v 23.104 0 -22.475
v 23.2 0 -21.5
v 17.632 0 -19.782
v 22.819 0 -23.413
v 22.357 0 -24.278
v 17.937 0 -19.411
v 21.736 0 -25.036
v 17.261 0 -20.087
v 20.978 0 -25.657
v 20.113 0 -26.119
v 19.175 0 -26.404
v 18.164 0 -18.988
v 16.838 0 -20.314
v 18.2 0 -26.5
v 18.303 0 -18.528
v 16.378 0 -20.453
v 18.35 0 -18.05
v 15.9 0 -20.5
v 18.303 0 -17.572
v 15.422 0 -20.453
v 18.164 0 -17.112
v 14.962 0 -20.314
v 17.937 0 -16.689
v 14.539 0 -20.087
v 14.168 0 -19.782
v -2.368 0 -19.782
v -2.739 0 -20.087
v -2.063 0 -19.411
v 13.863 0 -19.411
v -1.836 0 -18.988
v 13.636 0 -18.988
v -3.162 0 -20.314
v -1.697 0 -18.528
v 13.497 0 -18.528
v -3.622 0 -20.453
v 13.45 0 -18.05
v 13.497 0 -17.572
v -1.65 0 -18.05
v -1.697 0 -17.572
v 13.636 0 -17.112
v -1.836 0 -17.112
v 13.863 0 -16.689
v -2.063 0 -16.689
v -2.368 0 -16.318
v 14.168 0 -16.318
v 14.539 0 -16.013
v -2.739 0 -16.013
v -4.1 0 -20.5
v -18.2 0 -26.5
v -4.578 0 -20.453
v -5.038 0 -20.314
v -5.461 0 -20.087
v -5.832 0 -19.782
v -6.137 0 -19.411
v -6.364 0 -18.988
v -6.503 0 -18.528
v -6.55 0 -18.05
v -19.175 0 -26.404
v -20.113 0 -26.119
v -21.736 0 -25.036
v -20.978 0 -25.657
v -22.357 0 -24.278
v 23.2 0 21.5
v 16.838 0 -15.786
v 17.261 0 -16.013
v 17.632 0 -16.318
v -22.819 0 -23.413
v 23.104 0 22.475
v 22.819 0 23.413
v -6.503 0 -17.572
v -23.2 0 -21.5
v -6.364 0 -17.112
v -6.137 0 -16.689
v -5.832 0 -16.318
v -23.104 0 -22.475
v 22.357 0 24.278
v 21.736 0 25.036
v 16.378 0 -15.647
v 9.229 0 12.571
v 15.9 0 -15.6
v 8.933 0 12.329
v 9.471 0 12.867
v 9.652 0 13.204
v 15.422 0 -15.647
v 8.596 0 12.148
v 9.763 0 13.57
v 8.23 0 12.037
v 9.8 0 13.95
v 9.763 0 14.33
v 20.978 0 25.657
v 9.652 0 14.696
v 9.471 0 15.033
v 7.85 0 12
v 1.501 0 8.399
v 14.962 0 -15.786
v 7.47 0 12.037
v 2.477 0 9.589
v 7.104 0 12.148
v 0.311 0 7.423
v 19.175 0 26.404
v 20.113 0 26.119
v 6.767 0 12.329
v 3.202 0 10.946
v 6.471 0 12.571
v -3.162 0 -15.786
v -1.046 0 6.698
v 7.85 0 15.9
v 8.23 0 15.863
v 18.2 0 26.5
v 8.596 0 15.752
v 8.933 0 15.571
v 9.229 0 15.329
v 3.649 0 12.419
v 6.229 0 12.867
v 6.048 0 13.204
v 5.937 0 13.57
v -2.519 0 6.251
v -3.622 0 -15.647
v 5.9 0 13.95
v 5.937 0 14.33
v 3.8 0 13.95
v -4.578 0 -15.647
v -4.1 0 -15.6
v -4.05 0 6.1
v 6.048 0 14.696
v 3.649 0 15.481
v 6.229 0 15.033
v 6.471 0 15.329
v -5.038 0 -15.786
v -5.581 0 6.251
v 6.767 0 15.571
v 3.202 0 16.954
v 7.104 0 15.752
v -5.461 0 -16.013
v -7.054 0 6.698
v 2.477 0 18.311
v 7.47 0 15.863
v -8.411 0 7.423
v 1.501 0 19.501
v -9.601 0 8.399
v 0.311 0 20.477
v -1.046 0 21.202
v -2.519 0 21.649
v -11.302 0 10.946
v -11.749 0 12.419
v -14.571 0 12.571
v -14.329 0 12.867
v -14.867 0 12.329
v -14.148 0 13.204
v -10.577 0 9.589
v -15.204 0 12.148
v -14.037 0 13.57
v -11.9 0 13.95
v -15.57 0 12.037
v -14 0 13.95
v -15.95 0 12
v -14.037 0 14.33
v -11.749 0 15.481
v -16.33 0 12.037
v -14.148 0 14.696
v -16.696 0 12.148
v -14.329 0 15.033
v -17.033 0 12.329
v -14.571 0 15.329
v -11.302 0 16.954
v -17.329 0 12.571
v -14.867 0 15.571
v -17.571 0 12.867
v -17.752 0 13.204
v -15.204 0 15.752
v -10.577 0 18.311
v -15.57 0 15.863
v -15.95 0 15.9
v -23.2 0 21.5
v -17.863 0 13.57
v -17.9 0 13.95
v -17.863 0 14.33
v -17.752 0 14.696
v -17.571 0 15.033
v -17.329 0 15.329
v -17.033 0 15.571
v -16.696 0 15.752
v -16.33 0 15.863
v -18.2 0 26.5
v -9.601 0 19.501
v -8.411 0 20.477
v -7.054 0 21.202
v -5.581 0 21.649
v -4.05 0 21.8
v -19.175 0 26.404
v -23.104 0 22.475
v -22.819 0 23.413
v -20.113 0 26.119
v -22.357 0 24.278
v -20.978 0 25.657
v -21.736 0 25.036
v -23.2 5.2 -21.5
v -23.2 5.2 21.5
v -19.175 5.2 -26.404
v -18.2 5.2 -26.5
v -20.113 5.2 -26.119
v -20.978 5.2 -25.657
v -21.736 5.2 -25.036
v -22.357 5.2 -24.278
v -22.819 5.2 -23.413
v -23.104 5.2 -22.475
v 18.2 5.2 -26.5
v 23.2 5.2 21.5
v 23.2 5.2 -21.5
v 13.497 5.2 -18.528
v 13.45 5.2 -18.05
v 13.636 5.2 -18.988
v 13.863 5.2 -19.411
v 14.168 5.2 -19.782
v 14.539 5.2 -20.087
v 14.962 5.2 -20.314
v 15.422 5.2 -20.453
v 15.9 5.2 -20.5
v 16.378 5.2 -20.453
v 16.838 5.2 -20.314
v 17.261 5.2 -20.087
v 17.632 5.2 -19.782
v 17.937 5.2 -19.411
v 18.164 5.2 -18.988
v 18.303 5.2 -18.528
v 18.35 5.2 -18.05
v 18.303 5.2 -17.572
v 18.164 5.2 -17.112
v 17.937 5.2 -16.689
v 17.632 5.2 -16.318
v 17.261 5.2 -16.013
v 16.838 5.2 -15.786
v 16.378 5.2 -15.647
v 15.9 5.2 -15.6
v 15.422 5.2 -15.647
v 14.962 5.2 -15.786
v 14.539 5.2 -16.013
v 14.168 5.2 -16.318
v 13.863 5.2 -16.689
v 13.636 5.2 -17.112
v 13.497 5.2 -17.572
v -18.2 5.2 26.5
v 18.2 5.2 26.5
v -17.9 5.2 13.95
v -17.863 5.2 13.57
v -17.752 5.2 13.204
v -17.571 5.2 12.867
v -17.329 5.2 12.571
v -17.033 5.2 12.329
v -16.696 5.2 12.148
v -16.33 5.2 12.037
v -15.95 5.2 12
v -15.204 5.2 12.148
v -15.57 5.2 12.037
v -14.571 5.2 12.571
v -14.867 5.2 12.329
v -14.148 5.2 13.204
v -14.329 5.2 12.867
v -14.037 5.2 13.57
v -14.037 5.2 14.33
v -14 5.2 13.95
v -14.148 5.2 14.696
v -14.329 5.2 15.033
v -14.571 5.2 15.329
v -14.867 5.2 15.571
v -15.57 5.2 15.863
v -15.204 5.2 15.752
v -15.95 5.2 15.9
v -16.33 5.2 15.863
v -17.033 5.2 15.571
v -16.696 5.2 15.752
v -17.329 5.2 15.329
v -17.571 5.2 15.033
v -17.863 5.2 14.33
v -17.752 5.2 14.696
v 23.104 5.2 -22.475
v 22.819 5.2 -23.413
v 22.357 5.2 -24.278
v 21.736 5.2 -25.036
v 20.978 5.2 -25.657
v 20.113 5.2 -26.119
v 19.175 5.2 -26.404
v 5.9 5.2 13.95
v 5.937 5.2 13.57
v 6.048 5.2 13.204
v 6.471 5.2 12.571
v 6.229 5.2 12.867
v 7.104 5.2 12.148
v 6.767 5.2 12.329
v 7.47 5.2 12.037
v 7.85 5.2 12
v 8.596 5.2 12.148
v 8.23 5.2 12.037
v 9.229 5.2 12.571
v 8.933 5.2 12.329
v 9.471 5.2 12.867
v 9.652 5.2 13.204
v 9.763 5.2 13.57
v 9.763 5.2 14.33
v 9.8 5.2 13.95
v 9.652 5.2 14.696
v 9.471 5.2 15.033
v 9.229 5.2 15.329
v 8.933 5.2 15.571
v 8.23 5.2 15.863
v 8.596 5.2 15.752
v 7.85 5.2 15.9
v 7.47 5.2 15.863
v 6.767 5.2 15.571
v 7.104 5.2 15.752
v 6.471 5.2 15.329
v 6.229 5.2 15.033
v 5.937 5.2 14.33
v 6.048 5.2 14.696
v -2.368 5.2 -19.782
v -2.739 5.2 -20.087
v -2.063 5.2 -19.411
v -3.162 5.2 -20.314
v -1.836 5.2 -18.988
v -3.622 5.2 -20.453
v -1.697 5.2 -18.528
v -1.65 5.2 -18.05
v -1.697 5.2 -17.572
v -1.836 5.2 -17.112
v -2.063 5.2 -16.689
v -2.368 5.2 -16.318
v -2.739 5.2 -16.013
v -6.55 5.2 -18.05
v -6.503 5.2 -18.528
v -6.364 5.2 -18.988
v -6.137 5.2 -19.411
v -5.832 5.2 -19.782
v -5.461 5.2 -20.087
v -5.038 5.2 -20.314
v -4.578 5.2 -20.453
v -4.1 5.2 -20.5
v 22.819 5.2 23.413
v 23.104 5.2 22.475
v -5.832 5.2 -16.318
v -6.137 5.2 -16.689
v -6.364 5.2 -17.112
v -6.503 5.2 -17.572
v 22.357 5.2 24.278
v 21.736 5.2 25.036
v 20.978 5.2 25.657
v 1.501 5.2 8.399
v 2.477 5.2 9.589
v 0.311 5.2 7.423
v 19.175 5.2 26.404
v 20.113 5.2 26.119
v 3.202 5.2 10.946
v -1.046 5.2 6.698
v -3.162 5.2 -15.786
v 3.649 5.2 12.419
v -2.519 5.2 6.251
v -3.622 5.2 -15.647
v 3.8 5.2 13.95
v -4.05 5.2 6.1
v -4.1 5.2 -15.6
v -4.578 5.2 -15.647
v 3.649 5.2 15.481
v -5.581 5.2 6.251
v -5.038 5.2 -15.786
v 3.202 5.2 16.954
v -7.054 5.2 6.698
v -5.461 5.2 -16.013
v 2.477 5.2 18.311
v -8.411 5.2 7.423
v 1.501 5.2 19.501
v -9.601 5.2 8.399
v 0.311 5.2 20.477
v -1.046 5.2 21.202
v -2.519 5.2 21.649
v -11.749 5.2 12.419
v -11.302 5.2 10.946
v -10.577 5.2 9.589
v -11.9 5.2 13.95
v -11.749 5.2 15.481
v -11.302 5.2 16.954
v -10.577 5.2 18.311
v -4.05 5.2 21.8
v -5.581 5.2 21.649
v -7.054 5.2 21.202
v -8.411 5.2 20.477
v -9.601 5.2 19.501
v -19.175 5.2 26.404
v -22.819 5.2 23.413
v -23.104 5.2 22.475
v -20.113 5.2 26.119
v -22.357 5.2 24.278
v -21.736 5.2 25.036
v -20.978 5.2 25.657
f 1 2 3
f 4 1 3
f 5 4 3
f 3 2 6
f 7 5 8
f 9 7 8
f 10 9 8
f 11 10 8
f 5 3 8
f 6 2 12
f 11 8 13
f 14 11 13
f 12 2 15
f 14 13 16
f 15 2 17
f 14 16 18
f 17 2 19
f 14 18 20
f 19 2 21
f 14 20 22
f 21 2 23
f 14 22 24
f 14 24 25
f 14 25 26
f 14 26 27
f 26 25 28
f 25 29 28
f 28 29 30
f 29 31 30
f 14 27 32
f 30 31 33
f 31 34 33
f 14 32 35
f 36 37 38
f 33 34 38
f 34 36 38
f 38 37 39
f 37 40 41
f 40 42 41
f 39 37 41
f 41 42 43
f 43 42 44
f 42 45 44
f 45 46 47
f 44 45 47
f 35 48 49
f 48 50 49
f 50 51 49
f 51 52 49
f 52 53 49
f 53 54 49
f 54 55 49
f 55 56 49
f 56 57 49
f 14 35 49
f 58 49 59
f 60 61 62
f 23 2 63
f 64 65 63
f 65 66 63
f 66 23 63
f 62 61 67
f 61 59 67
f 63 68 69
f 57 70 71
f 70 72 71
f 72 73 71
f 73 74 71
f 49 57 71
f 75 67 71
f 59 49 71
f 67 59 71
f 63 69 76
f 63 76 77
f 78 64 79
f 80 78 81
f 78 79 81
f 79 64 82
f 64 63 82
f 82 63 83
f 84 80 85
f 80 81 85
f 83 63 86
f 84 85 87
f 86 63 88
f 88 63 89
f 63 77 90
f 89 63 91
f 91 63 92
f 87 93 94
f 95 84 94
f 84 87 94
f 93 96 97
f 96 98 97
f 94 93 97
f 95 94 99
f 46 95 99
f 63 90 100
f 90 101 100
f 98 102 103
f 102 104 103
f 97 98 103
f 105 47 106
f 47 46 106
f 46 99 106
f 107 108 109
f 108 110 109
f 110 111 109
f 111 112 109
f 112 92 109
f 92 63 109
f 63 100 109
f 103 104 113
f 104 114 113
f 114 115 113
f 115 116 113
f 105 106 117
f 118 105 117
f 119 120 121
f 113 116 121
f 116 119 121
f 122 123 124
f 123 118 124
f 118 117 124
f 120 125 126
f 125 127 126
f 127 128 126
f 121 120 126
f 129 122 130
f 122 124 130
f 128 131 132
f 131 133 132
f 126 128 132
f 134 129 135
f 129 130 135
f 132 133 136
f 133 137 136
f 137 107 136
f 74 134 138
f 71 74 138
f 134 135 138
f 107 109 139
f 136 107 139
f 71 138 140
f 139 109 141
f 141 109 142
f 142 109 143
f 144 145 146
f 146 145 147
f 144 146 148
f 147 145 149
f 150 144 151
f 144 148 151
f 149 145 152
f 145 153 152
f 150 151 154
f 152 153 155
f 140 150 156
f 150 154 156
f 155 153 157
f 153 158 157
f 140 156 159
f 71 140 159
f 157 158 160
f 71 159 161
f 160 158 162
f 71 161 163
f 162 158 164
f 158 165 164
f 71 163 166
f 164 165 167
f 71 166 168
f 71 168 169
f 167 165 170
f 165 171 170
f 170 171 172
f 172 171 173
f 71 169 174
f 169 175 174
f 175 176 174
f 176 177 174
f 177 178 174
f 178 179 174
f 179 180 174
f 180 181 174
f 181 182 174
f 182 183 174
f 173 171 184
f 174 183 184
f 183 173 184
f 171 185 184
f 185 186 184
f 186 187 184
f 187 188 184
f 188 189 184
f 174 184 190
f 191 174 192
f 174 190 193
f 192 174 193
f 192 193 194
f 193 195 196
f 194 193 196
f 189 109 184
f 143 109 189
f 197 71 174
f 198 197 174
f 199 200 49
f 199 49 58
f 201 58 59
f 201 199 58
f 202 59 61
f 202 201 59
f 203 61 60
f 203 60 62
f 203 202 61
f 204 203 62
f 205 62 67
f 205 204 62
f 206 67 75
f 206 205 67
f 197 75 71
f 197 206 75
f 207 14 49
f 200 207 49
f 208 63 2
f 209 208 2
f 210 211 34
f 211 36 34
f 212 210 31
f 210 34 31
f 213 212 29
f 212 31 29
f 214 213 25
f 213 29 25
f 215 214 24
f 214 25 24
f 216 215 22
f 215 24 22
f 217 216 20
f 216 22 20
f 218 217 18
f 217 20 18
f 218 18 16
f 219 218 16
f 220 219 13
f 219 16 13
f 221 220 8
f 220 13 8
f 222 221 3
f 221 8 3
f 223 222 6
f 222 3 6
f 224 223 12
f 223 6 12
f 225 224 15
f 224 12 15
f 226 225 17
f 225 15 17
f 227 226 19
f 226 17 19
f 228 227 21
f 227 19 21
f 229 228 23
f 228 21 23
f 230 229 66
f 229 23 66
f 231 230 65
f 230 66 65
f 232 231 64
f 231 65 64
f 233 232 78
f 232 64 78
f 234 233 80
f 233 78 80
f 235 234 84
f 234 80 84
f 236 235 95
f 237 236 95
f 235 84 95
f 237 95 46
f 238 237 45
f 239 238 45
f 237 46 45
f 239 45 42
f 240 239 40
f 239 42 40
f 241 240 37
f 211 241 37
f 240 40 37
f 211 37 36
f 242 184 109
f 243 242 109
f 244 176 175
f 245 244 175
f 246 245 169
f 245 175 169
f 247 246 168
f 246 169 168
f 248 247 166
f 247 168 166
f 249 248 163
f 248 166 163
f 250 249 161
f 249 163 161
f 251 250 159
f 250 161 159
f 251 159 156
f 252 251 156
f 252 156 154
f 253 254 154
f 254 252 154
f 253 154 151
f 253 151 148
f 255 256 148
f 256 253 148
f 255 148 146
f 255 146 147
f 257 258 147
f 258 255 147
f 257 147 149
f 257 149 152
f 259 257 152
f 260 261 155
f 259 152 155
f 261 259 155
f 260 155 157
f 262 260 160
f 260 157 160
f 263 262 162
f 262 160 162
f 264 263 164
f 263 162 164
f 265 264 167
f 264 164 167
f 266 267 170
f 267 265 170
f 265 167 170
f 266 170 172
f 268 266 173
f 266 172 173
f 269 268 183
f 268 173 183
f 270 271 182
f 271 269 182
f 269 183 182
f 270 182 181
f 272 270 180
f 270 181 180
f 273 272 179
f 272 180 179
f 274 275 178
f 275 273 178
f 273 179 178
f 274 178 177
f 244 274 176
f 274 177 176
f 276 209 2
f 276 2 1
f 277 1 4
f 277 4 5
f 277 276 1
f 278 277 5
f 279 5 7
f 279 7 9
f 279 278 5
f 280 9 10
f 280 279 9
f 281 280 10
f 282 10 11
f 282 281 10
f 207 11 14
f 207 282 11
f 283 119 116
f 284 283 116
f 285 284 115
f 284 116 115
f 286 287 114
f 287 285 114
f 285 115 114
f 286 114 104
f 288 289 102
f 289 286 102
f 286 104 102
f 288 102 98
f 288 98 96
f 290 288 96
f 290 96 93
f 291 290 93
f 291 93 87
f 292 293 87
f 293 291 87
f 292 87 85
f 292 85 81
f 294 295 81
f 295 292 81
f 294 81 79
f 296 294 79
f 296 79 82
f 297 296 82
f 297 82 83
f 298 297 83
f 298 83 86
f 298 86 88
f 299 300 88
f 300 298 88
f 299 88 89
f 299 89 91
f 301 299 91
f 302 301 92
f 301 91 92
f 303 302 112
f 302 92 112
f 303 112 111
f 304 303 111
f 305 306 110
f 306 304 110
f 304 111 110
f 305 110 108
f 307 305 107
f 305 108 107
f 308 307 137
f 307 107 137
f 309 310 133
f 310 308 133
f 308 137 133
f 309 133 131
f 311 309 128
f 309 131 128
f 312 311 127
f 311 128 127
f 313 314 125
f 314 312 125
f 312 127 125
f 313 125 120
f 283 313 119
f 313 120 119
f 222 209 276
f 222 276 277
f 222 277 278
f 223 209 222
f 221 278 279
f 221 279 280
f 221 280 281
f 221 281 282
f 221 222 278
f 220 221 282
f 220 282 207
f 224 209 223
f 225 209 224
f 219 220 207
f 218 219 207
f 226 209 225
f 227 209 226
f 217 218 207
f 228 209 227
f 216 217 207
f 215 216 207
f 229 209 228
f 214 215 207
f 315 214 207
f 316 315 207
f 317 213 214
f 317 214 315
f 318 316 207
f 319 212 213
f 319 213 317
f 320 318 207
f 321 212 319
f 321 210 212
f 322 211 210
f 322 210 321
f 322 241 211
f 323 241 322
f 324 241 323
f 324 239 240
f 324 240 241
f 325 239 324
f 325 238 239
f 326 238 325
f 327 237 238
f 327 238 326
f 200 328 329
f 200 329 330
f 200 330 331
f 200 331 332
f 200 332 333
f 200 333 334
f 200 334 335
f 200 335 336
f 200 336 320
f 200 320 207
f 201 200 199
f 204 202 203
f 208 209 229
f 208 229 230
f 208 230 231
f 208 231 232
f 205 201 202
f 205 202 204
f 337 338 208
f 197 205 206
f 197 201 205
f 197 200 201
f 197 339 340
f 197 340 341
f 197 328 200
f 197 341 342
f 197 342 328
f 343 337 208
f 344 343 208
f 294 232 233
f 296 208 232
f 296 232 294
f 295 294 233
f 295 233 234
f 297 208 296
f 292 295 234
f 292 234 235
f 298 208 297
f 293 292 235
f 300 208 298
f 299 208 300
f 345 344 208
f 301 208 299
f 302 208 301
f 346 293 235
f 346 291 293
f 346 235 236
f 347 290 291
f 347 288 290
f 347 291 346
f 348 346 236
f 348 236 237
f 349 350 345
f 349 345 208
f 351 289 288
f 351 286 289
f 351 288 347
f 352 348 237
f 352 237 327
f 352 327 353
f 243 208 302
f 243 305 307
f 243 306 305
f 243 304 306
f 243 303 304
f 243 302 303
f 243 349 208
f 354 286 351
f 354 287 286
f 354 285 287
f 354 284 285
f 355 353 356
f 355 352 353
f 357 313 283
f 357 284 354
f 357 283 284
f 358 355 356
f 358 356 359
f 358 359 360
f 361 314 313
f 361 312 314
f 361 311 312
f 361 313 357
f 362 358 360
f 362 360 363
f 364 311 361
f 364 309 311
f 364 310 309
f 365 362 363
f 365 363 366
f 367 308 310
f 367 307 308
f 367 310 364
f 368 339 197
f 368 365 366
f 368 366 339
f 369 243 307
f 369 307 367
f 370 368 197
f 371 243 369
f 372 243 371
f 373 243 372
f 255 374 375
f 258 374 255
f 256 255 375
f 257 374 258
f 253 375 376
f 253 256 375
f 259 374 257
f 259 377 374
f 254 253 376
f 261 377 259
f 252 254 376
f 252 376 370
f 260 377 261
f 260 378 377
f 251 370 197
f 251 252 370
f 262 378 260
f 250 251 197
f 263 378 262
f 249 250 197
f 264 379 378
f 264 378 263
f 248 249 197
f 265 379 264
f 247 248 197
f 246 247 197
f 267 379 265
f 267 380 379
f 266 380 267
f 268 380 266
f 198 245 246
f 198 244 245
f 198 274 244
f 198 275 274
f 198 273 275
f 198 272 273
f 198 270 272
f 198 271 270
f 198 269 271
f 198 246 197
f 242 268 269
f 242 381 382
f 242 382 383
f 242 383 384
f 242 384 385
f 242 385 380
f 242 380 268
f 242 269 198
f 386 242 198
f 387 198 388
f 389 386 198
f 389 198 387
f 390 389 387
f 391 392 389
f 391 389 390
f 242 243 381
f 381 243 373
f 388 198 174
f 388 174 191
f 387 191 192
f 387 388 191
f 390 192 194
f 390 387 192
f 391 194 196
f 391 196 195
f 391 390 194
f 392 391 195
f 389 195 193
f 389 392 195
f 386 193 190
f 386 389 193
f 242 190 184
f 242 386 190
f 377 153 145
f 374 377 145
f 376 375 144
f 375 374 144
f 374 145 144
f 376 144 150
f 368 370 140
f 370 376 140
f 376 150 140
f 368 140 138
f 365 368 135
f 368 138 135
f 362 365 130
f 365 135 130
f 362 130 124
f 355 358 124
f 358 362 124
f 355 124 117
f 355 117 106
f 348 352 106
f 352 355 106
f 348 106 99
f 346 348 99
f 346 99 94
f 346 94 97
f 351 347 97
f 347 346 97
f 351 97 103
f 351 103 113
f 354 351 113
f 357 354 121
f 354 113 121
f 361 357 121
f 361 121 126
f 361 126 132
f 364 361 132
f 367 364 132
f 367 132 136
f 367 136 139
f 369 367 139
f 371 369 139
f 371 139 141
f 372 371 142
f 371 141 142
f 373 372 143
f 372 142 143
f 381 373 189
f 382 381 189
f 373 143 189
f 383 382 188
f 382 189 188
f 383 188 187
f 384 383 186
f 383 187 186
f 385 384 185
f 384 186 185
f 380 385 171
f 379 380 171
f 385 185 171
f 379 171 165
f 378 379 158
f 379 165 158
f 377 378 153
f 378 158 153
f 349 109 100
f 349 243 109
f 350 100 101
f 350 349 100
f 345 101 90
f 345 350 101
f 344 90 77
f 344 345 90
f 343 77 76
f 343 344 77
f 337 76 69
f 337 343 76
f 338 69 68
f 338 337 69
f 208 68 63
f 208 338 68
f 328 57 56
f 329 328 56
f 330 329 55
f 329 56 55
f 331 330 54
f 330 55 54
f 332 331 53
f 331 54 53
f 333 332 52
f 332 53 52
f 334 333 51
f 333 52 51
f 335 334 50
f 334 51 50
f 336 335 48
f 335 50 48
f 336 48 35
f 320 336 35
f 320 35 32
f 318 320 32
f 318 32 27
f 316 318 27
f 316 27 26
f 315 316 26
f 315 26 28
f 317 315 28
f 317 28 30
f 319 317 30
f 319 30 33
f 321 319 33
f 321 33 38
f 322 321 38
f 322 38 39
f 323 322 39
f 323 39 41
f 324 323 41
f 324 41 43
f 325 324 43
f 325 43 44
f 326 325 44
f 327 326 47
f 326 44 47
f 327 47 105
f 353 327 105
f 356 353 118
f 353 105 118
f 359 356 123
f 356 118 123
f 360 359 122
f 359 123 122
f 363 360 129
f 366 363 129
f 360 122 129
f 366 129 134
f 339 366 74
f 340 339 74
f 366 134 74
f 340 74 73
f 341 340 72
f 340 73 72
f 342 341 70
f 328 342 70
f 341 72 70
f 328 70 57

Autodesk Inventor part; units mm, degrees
ref_plane "YZ Plane" through (0, 0, 0) normal (1, 0, 0) x (0, 1, 0)
ref_plane "XZ Plane" through (0, 0, 0) normal (0, 1, 0) x (-1, 0, 0)
ref_plane "XY Plane" through (0, 0, 0) normal (0, 0, 1) x (1, 0, 0)
sketch "Boceto1" plane through (0, 0, 0) normal (0, 1, 0) x (-1, 0, 0)
  line L0 (-23.2, -26.5) -> (23.2, -26.5)
  line L1 (23.2, -26.5) -> (23.2, 26.5)
  line L2 (23.2, 26.5) -> (-23.2, 26.5)
  line L3 (-23.2, 26.5) -> (-23.2, -26.5)
  line L4 (-23.2, -26.5) -> (23.2, 26.5) construction
  line L5 (23.2, -26.5) -> (-23.2, 26.5) construction
  line L6 (23.2, 26.5) -> (23.2, 21.8)
  line L7 (23.2, 21.8) -> (-23.2, 21.8)
  line L8 (23.2, 21.8) -> (11.9, 21.8)
  line L9 (11.9, 21.8) -> (11.9, 0)
  circle A0 centre (4.05, 13.95) radius 7.85
  line L10 (11.9, 13.95) -> (14, 13.95)
  line L11 (14, 13.95) -> (15.95, 13.95)
  circle A1 centre (15.95, 13.95) radius 1.95
  line L12 (-3.8, 13.95) -> (-5.9, 13.95)
  line L13 (-5.9, 13.95) -> (-7.85, 13.95)
  circle A2 centre (-7.85, 13.95) radius 1.95
  line L14 (23.2, -26.5) -> (23.2, -20.5)
  line L15 (23.2, -20.5) -> (-23.2, -20.5)
  line L16 (23.2, -20.5) -> (6.55, -20.5)
  line L17 (6.55, -20.5) -> (1.65, -20.5)
  line L18 (4.1, -20.5) -> (4.1, -18.05)
  circle A3 centre (4.1, -18.05) radius 2.45
  line L19 (1.65, -18.05) -> (-13.45, -18.05)
  line L20 (-13.45, -18.05) -> (-15.9, -18.05)
  circle A4 centre (-15.9, -18.05) radius 2.45
  point P0 (0, 0)
  point P1 (4.05, 21.8)
  dimension "d0" = 46.4
  dimension "d1" = 53
  dimension "d2" = 4.7
  dimension "d3" = 11.3
  dimension "d4" = 15.7
  dimension "d5" = 2.1
  dimension "d6" = 1.95
  dimension "d7" = 2.1
  dimension "d8" = 1.95
  dimension "d9" = 6
  dimension "d10" = 16.65
  dimension "d11" = 4.9
  dimension "d12" = 2.45
  dimension "d13" = 15.1
  dimension "d14" = 2.45
extrude "Extrusión1" add sketch "Boceto1" along normal blind 5.2 contours L3 L15 L1 L0 | L3 L7 A0 L9 L1 L15 A3 L19 A4 | L3 L2 L1 L7 | A4 L19 A3 L15 | L7 L9 A0
fillet "Empalme1" radius 5 4 edges at (-23.2, 2.6, 26.5) (-23.2, 2.6, -26.5) (23.2, 2.6, -26.5) (23.2, 2.6, 26.5)
properties part number "soporte eje z"
